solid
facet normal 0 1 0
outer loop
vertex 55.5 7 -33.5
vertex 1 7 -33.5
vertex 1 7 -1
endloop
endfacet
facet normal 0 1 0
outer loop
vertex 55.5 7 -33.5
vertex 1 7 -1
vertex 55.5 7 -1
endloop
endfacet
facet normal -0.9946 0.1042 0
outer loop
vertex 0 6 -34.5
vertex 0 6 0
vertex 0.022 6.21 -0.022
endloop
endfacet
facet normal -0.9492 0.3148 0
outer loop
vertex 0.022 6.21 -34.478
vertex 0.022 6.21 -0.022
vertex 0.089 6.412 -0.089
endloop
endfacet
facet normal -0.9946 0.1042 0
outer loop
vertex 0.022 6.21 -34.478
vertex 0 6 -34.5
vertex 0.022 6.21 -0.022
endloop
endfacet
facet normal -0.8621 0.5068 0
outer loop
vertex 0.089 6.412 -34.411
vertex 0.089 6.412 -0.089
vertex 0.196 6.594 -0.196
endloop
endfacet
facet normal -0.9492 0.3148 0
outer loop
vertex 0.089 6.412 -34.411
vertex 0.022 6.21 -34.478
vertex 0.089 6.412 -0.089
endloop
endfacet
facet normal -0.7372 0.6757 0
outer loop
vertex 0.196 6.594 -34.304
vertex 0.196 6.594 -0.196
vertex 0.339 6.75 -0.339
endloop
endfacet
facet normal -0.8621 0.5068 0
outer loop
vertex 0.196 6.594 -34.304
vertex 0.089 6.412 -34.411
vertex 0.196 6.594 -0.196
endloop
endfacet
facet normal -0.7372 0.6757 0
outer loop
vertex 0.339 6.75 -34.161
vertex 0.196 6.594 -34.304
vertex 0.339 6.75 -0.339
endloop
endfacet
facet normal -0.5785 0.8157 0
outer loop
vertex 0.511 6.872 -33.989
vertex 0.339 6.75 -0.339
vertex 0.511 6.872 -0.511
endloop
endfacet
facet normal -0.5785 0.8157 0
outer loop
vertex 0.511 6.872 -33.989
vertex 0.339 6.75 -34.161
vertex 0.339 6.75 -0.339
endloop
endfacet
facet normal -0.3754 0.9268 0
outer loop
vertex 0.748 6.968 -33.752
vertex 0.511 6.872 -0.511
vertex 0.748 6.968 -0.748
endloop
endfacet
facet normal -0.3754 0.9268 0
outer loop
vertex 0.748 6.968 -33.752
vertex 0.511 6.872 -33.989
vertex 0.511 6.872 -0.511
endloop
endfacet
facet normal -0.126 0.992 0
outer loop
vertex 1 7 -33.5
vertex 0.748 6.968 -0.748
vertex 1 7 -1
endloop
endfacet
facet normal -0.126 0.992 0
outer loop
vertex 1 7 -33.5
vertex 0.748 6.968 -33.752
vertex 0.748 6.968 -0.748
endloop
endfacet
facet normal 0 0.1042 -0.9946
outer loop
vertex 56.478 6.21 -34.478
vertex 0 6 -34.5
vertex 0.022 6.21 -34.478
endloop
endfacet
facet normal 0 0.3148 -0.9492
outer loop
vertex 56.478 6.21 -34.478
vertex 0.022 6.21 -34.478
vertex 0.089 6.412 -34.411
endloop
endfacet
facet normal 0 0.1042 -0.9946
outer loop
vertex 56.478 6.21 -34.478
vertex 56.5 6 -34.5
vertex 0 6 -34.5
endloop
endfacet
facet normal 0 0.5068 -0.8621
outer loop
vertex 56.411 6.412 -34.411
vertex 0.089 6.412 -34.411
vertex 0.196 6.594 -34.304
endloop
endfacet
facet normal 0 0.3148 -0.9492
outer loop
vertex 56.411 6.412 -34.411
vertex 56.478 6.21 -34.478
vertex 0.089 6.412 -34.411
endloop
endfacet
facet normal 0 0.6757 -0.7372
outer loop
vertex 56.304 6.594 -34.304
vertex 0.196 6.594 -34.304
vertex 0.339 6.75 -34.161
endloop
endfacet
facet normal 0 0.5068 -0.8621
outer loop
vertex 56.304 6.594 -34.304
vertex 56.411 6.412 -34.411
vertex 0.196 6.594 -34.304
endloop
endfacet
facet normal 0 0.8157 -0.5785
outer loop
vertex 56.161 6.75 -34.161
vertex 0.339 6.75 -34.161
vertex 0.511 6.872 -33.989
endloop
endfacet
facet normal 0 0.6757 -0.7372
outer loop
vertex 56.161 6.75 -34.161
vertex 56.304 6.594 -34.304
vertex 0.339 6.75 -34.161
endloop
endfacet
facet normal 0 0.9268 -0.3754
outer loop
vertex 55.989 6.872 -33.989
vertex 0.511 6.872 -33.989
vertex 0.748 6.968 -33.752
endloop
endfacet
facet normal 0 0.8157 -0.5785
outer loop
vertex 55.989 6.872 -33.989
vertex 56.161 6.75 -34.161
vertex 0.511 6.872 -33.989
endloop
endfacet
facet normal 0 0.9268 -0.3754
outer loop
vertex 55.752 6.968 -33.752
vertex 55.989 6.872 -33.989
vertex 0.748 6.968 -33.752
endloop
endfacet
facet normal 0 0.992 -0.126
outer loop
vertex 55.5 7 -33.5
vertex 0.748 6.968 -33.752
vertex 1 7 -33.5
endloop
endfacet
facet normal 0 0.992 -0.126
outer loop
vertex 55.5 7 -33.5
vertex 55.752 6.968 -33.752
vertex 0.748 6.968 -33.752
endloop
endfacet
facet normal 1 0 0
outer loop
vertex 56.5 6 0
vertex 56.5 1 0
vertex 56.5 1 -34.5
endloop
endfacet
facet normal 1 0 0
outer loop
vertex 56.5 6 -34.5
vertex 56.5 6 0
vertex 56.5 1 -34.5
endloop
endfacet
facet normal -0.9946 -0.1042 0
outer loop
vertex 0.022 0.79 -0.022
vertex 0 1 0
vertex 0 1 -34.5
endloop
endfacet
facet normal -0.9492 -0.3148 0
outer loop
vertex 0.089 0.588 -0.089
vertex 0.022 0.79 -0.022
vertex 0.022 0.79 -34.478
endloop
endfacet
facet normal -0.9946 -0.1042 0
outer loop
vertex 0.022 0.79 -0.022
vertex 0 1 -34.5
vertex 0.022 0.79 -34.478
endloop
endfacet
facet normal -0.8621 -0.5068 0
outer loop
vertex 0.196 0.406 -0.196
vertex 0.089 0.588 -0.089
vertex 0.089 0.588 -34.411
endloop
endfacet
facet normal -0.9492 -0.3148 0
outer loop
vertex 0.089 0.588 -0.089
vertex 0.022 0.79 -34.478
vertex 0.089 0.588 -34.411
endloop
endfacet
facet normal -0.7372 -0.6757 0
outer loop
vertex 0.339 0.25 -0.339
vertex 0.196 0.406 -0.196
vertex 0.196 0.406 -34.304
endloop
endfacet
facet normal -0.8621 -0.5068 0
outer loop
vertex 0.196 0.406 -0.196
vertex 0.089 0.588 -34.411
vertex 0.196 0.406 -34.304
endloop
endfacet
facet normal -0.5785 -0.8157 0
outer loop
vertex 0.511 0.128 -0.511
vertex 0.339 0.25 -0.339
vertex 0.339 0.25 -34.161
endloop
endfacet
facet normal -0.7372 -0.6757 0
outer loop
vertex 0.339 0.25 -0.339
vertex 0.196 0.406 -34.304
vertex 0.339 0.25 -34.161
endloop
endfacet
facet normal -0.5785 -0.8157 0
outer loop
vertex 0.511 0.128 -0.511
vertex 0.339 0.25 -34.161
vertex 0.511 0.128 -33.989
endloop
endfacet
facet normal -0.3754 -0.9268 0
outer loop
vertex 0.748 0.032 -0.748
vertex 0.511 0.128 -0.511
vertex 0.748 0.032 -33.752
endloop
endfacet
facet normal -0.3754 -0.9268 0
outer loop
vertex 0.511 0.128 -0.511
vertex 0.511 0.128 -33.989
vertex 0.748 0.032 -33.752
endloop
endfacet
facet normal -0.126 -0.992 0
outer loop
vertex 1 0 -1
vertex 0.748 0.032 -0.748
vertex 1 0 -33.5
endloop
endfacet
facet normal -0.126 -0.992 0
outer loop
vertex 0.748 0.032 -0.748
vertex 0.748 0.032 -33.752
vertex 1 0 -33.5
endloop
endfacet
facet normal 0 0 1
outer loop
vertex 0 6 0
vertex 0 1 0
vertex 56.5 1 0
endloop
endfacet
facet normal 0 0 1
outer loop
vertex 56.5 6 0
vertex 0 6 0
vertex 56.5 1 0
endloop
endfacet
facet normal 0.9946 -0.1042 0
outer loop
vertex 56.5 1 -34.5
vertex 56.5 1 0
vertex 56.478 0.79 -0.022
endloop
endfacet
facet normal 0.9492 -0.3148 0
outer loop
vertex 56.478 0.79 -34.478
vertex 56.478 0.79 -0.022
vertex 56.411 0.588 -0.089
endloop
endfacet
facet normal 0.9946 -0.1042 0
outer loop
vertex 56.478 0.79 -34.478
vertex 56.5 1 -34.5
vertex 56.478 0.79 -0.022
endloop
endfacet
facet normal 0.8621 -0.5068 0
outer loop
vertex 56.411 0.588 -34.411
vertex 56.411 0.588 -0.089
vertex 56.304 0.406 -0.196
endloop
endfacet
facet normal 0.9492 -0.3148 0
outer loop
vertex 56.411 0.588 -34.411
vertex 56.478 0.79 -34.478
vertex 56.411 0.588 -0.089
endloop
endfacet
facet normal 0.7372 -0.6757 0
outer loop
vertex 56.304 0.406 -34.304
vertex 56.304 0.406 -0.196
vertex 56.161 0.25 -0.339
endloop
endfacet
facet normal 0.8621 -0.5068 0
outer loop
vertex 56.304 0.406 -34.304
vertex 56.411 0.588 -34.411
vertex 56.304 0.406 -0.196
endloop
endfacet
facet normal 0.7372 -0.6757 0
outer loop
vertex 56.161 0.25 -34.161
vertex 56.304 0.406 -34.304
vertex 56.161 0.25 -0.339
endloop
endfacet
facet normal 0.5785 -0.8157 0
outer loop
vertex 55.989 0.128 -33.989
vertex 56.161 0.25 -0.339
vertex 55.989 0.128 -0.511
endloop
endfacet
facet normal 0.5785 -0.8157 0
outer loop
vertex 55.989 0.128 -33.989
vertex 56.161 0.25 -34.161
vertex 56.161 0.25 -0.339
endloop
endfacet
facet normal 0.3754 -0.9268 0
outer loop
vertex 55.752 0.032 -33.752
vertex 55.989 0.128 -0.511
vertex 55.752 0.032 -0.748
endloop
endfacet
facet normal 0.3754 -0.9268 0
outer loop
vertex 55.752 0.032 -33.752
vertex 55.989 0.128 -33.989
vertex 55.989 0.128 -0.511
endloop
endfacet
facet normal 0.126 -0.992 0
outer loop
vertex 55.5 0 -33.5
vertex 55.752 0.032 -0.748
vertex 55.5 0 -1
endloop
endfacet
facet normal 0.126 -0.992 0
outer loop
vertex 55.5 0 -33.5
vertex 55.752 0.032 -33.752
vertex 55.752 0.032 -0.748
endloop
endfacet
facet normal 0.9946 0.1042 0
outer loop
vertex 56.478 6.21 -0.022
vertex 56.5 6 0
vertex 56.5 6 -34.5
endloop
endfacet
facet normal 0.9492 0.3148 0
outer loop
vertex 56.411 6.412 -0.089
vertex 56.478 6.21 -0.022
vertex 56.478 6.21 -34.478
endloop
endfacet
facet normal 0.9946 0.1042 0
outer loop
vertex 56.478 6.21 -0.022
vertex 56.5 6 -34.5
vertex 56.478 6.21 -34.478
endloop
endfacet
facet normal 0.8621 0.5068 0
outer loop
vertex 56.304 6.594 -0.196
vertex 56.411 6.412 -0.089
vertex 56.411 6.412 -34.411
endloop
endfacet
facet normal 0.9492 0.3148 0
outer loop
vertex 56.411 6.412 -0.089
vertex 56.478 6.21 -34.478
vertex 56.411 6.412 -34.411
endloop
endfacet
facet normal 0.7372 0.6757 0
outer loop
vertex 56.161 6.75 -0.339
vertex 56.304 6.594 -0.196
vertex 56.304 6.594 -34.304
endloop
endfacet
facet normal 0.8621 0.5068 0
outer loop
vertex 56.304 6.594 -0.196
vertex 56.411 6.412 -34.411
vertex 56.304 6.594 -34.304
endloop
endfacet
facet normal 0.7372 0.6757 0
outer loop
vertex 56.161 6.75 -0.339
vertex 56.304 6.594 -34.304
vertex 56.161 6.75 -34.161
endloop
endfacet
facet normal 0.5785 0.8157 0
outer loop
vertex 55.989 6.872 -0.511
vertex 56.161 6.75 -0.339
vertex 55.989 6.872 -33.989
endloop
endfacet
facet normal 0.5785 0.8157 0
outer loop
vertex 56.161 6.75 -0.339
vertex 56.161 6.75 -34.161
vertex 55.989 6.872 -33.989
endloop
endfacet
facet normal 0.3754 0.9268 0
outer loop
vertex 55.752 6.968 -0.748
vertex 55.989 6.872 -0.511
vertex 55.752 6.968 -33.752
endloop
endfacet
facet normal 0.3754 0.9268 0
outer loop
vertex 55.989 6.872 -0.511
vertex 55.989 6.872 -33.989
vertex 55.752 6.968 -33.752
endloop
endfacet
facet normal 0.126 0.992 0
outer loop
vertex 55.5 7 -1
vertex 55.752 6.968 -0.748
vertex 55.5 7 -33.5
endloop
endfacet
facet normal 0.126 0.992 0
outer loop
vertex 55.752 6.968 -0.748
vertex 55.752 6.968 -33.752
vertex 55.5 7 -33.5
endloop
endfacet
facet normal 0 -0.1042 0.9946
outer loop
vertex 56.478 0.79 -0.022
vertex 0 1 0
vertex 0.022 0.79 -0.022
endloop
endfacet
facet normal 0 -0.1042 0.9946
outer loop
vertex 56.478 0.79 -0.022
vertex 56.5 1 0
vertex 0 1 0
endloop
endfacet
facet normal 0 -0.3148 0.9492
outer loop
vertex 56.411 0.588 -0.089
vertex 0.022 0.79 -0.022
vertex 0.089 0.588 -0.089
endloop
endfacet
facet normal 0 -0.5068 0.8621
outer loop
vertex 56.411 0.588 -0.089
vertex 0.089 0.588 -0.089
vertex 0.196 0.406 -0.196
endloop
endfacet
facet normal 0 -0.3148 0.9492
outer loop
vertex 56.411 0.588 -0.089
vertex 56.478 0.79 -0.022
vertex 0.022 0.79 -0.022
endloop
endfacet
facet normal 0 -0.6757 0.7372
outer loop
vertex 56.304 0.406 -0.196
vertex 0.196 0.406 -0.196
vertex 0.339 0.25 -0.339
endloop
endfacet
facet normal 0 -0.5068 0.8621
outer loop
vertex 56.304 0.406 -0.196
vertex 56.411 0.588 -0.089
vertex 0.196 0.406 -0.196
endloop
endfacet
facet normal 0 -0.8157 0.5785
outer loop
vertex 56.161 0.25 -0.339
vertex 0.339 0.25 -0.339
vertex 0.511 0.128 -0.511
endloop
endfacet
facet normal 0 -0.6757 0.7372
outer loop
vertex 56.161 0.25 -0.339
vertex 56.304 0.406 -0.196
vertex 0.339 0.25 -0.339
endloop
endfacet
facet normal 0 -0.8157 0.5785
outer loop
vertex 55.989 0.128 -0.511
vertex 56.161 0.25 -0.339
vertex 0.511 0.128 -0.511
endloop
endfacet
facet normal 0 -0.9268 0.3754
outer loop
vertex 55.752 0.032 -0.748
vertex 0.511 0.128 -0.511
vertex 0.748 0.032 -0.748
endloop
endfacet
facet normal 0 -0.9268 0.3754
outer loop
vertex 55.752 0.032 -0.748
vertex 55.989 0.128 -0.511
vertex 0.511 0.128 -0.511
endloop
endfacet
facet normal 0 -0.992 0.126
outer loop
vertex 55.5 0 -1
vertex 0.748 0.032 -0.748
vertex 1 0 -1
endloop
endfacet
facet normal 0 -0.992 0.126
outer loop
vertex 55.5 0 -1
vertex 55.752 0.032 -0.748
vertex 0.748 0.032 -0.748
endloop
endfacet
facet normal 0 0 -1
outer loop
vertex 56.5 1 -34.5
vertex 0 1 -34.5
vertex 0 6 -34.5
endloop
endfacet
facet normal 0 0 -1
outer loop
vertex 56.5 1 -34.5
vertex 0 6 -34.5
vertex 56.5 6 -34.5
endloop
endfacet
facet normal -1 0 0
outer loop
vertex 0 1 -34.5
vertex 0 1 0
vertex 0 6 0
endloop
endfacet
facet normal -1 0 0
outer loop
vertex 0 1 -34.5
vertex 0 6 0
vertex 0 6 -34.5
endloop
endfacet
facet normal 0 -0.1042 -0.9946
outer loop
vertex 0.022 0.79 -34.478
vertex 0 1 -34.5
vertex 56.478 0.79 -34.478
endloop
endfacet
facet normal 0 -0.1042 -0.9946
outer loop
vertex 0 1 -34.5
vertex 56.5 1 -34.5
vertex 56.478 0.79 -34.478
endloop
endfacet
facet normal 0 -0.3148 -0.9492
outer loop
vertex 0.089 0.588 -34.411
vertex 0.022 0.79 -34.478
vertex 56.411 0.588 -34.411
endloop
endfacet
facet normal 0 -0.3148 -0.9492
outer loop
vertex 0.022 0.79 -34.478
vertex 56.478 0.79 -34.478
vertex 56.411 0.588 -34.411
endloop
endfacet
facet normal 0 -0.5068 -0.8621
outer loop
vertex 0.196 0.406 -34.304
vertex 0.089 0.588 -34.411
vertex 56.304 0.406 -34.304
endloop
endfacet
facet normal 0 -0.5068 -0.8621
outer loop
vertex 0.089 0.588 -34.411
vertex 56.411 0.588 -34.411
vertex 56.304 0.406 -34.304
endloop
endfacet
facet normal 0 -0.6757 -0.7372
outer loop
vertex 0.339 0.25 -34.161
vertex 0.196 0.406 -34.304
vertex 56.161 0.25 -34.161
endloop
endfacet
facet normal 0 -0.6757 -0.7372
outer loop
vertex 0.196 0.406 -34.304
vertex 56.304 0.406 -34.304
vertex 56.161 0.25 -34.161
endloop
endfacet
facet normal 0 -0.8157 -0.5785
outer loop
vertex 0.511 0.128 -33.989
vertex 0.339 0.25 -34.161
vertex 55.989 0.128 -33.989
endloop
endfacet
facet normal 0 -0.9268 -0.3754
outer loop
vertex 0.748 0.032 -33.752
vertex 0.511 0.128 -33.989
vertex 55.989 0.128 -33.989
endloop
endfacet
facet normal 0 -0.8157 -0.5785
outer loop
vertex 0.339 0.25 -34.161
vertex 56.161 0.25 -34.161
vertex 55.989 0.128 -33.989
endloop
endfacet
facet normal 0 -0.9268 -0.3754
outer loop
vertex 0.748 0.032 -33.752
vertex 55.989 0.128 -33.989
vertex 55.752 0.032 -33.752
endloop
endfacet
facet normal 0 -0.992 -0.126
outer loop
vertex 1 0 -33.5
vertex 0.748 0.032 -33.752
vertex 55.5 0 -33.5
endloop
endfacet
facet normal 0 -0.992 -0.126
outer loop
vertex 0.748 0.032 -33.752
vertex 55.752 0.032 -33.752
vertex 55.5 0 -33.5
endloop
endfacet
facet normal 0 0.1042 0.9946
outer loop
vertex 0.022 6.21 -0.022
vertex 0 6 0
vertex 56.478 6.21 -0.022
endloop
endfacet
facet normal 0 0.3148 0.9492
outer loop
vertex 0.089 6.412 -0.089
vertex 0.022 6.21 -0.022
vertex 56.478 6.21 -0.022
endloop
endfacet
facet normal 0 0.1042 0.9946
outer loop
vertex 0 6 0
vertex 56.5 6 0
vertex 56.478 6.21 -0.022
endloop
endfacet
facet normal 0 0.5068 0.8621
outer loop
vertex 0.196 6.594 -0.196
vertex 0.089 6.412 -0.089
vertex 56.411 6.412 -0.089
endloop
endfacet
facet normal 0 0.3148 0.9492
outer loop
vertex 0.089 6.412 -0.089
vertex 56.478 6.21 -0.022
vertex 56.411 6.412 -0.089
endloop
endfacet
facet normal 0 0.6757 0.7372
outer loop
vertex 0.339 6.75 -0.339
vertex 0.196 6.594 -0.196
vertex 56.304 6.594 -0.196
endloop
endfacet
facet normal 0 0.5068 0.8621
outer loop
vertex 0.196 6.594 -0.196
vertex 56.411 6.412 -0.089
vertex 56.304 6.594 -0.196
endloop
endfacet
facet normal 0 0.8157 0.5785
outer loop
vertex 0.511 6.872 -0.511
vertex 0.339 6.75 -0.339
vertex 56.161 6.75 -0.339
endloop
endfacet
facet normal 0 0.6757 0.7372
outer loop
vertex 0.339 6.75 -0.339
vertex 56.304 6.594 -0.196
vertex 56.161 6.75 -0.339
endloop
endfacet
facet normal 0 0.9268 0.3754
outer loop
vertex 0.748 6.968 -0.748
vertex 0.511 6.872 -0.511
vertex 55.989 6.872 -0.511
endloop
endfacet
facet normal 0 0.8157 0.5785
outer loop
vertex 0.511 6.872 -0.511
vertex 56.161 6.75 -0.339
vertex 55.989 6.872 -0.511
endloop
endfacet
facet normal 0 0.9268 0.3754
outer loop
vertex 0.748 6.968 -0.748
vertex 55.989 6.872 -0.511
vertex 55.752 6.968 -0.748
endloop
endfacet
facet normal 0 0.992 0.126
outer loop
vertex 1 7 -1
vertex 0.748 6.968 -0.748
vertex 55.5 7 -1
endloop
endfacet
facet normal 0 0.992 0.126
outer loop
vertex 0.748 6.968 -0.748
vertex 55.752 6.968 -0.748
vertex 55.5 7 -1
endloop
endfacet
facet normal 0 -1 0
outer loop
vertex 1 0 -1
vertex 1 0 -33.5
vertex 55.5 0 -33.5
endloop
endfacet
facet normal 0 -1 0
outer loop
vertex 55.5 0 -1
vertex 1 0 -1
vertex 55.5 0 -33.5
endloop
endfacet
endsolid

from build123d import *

# Parameters (mm, degrees)
SKETCH_1_W      = 56.5
SKETCH_1_H      = 34.5
EXTRUDE_1_DEPTH = 7
FILLET_1_R      = 1


with BuildPart() as part:
    # 草圖1 → 填料-伸長1 (new body)
    with BuildSketch(Plane(origin=(0, 0, 0), x_dir=(1, 0, 0), z_dir=(0, 1, 0))):
        with Locations((28.25, 17.25)):
            Rectangle(SKETCH_1_W, SKETCH_1_H)
    extrude(amount=EXTRUDE_1_DEPTH)

    # 圓角1
    fillet_1_edges = [part.edges().sort_by_distance(p)[0] for p in [
        (56.5, 7, -17.25),
        (28.25, 7, -34.5),
        (0, 7, -17.25),
        (28.25, 0, -34.5),
        (56.5, 0, -17.25),
        (28.25, 0, 0),
        (0, 0, -17.25),
        (28.25, 7, 0),
    ]]
    fillet(fillet_1_edges, radius=FILLET_1_R)


solid = part.part
